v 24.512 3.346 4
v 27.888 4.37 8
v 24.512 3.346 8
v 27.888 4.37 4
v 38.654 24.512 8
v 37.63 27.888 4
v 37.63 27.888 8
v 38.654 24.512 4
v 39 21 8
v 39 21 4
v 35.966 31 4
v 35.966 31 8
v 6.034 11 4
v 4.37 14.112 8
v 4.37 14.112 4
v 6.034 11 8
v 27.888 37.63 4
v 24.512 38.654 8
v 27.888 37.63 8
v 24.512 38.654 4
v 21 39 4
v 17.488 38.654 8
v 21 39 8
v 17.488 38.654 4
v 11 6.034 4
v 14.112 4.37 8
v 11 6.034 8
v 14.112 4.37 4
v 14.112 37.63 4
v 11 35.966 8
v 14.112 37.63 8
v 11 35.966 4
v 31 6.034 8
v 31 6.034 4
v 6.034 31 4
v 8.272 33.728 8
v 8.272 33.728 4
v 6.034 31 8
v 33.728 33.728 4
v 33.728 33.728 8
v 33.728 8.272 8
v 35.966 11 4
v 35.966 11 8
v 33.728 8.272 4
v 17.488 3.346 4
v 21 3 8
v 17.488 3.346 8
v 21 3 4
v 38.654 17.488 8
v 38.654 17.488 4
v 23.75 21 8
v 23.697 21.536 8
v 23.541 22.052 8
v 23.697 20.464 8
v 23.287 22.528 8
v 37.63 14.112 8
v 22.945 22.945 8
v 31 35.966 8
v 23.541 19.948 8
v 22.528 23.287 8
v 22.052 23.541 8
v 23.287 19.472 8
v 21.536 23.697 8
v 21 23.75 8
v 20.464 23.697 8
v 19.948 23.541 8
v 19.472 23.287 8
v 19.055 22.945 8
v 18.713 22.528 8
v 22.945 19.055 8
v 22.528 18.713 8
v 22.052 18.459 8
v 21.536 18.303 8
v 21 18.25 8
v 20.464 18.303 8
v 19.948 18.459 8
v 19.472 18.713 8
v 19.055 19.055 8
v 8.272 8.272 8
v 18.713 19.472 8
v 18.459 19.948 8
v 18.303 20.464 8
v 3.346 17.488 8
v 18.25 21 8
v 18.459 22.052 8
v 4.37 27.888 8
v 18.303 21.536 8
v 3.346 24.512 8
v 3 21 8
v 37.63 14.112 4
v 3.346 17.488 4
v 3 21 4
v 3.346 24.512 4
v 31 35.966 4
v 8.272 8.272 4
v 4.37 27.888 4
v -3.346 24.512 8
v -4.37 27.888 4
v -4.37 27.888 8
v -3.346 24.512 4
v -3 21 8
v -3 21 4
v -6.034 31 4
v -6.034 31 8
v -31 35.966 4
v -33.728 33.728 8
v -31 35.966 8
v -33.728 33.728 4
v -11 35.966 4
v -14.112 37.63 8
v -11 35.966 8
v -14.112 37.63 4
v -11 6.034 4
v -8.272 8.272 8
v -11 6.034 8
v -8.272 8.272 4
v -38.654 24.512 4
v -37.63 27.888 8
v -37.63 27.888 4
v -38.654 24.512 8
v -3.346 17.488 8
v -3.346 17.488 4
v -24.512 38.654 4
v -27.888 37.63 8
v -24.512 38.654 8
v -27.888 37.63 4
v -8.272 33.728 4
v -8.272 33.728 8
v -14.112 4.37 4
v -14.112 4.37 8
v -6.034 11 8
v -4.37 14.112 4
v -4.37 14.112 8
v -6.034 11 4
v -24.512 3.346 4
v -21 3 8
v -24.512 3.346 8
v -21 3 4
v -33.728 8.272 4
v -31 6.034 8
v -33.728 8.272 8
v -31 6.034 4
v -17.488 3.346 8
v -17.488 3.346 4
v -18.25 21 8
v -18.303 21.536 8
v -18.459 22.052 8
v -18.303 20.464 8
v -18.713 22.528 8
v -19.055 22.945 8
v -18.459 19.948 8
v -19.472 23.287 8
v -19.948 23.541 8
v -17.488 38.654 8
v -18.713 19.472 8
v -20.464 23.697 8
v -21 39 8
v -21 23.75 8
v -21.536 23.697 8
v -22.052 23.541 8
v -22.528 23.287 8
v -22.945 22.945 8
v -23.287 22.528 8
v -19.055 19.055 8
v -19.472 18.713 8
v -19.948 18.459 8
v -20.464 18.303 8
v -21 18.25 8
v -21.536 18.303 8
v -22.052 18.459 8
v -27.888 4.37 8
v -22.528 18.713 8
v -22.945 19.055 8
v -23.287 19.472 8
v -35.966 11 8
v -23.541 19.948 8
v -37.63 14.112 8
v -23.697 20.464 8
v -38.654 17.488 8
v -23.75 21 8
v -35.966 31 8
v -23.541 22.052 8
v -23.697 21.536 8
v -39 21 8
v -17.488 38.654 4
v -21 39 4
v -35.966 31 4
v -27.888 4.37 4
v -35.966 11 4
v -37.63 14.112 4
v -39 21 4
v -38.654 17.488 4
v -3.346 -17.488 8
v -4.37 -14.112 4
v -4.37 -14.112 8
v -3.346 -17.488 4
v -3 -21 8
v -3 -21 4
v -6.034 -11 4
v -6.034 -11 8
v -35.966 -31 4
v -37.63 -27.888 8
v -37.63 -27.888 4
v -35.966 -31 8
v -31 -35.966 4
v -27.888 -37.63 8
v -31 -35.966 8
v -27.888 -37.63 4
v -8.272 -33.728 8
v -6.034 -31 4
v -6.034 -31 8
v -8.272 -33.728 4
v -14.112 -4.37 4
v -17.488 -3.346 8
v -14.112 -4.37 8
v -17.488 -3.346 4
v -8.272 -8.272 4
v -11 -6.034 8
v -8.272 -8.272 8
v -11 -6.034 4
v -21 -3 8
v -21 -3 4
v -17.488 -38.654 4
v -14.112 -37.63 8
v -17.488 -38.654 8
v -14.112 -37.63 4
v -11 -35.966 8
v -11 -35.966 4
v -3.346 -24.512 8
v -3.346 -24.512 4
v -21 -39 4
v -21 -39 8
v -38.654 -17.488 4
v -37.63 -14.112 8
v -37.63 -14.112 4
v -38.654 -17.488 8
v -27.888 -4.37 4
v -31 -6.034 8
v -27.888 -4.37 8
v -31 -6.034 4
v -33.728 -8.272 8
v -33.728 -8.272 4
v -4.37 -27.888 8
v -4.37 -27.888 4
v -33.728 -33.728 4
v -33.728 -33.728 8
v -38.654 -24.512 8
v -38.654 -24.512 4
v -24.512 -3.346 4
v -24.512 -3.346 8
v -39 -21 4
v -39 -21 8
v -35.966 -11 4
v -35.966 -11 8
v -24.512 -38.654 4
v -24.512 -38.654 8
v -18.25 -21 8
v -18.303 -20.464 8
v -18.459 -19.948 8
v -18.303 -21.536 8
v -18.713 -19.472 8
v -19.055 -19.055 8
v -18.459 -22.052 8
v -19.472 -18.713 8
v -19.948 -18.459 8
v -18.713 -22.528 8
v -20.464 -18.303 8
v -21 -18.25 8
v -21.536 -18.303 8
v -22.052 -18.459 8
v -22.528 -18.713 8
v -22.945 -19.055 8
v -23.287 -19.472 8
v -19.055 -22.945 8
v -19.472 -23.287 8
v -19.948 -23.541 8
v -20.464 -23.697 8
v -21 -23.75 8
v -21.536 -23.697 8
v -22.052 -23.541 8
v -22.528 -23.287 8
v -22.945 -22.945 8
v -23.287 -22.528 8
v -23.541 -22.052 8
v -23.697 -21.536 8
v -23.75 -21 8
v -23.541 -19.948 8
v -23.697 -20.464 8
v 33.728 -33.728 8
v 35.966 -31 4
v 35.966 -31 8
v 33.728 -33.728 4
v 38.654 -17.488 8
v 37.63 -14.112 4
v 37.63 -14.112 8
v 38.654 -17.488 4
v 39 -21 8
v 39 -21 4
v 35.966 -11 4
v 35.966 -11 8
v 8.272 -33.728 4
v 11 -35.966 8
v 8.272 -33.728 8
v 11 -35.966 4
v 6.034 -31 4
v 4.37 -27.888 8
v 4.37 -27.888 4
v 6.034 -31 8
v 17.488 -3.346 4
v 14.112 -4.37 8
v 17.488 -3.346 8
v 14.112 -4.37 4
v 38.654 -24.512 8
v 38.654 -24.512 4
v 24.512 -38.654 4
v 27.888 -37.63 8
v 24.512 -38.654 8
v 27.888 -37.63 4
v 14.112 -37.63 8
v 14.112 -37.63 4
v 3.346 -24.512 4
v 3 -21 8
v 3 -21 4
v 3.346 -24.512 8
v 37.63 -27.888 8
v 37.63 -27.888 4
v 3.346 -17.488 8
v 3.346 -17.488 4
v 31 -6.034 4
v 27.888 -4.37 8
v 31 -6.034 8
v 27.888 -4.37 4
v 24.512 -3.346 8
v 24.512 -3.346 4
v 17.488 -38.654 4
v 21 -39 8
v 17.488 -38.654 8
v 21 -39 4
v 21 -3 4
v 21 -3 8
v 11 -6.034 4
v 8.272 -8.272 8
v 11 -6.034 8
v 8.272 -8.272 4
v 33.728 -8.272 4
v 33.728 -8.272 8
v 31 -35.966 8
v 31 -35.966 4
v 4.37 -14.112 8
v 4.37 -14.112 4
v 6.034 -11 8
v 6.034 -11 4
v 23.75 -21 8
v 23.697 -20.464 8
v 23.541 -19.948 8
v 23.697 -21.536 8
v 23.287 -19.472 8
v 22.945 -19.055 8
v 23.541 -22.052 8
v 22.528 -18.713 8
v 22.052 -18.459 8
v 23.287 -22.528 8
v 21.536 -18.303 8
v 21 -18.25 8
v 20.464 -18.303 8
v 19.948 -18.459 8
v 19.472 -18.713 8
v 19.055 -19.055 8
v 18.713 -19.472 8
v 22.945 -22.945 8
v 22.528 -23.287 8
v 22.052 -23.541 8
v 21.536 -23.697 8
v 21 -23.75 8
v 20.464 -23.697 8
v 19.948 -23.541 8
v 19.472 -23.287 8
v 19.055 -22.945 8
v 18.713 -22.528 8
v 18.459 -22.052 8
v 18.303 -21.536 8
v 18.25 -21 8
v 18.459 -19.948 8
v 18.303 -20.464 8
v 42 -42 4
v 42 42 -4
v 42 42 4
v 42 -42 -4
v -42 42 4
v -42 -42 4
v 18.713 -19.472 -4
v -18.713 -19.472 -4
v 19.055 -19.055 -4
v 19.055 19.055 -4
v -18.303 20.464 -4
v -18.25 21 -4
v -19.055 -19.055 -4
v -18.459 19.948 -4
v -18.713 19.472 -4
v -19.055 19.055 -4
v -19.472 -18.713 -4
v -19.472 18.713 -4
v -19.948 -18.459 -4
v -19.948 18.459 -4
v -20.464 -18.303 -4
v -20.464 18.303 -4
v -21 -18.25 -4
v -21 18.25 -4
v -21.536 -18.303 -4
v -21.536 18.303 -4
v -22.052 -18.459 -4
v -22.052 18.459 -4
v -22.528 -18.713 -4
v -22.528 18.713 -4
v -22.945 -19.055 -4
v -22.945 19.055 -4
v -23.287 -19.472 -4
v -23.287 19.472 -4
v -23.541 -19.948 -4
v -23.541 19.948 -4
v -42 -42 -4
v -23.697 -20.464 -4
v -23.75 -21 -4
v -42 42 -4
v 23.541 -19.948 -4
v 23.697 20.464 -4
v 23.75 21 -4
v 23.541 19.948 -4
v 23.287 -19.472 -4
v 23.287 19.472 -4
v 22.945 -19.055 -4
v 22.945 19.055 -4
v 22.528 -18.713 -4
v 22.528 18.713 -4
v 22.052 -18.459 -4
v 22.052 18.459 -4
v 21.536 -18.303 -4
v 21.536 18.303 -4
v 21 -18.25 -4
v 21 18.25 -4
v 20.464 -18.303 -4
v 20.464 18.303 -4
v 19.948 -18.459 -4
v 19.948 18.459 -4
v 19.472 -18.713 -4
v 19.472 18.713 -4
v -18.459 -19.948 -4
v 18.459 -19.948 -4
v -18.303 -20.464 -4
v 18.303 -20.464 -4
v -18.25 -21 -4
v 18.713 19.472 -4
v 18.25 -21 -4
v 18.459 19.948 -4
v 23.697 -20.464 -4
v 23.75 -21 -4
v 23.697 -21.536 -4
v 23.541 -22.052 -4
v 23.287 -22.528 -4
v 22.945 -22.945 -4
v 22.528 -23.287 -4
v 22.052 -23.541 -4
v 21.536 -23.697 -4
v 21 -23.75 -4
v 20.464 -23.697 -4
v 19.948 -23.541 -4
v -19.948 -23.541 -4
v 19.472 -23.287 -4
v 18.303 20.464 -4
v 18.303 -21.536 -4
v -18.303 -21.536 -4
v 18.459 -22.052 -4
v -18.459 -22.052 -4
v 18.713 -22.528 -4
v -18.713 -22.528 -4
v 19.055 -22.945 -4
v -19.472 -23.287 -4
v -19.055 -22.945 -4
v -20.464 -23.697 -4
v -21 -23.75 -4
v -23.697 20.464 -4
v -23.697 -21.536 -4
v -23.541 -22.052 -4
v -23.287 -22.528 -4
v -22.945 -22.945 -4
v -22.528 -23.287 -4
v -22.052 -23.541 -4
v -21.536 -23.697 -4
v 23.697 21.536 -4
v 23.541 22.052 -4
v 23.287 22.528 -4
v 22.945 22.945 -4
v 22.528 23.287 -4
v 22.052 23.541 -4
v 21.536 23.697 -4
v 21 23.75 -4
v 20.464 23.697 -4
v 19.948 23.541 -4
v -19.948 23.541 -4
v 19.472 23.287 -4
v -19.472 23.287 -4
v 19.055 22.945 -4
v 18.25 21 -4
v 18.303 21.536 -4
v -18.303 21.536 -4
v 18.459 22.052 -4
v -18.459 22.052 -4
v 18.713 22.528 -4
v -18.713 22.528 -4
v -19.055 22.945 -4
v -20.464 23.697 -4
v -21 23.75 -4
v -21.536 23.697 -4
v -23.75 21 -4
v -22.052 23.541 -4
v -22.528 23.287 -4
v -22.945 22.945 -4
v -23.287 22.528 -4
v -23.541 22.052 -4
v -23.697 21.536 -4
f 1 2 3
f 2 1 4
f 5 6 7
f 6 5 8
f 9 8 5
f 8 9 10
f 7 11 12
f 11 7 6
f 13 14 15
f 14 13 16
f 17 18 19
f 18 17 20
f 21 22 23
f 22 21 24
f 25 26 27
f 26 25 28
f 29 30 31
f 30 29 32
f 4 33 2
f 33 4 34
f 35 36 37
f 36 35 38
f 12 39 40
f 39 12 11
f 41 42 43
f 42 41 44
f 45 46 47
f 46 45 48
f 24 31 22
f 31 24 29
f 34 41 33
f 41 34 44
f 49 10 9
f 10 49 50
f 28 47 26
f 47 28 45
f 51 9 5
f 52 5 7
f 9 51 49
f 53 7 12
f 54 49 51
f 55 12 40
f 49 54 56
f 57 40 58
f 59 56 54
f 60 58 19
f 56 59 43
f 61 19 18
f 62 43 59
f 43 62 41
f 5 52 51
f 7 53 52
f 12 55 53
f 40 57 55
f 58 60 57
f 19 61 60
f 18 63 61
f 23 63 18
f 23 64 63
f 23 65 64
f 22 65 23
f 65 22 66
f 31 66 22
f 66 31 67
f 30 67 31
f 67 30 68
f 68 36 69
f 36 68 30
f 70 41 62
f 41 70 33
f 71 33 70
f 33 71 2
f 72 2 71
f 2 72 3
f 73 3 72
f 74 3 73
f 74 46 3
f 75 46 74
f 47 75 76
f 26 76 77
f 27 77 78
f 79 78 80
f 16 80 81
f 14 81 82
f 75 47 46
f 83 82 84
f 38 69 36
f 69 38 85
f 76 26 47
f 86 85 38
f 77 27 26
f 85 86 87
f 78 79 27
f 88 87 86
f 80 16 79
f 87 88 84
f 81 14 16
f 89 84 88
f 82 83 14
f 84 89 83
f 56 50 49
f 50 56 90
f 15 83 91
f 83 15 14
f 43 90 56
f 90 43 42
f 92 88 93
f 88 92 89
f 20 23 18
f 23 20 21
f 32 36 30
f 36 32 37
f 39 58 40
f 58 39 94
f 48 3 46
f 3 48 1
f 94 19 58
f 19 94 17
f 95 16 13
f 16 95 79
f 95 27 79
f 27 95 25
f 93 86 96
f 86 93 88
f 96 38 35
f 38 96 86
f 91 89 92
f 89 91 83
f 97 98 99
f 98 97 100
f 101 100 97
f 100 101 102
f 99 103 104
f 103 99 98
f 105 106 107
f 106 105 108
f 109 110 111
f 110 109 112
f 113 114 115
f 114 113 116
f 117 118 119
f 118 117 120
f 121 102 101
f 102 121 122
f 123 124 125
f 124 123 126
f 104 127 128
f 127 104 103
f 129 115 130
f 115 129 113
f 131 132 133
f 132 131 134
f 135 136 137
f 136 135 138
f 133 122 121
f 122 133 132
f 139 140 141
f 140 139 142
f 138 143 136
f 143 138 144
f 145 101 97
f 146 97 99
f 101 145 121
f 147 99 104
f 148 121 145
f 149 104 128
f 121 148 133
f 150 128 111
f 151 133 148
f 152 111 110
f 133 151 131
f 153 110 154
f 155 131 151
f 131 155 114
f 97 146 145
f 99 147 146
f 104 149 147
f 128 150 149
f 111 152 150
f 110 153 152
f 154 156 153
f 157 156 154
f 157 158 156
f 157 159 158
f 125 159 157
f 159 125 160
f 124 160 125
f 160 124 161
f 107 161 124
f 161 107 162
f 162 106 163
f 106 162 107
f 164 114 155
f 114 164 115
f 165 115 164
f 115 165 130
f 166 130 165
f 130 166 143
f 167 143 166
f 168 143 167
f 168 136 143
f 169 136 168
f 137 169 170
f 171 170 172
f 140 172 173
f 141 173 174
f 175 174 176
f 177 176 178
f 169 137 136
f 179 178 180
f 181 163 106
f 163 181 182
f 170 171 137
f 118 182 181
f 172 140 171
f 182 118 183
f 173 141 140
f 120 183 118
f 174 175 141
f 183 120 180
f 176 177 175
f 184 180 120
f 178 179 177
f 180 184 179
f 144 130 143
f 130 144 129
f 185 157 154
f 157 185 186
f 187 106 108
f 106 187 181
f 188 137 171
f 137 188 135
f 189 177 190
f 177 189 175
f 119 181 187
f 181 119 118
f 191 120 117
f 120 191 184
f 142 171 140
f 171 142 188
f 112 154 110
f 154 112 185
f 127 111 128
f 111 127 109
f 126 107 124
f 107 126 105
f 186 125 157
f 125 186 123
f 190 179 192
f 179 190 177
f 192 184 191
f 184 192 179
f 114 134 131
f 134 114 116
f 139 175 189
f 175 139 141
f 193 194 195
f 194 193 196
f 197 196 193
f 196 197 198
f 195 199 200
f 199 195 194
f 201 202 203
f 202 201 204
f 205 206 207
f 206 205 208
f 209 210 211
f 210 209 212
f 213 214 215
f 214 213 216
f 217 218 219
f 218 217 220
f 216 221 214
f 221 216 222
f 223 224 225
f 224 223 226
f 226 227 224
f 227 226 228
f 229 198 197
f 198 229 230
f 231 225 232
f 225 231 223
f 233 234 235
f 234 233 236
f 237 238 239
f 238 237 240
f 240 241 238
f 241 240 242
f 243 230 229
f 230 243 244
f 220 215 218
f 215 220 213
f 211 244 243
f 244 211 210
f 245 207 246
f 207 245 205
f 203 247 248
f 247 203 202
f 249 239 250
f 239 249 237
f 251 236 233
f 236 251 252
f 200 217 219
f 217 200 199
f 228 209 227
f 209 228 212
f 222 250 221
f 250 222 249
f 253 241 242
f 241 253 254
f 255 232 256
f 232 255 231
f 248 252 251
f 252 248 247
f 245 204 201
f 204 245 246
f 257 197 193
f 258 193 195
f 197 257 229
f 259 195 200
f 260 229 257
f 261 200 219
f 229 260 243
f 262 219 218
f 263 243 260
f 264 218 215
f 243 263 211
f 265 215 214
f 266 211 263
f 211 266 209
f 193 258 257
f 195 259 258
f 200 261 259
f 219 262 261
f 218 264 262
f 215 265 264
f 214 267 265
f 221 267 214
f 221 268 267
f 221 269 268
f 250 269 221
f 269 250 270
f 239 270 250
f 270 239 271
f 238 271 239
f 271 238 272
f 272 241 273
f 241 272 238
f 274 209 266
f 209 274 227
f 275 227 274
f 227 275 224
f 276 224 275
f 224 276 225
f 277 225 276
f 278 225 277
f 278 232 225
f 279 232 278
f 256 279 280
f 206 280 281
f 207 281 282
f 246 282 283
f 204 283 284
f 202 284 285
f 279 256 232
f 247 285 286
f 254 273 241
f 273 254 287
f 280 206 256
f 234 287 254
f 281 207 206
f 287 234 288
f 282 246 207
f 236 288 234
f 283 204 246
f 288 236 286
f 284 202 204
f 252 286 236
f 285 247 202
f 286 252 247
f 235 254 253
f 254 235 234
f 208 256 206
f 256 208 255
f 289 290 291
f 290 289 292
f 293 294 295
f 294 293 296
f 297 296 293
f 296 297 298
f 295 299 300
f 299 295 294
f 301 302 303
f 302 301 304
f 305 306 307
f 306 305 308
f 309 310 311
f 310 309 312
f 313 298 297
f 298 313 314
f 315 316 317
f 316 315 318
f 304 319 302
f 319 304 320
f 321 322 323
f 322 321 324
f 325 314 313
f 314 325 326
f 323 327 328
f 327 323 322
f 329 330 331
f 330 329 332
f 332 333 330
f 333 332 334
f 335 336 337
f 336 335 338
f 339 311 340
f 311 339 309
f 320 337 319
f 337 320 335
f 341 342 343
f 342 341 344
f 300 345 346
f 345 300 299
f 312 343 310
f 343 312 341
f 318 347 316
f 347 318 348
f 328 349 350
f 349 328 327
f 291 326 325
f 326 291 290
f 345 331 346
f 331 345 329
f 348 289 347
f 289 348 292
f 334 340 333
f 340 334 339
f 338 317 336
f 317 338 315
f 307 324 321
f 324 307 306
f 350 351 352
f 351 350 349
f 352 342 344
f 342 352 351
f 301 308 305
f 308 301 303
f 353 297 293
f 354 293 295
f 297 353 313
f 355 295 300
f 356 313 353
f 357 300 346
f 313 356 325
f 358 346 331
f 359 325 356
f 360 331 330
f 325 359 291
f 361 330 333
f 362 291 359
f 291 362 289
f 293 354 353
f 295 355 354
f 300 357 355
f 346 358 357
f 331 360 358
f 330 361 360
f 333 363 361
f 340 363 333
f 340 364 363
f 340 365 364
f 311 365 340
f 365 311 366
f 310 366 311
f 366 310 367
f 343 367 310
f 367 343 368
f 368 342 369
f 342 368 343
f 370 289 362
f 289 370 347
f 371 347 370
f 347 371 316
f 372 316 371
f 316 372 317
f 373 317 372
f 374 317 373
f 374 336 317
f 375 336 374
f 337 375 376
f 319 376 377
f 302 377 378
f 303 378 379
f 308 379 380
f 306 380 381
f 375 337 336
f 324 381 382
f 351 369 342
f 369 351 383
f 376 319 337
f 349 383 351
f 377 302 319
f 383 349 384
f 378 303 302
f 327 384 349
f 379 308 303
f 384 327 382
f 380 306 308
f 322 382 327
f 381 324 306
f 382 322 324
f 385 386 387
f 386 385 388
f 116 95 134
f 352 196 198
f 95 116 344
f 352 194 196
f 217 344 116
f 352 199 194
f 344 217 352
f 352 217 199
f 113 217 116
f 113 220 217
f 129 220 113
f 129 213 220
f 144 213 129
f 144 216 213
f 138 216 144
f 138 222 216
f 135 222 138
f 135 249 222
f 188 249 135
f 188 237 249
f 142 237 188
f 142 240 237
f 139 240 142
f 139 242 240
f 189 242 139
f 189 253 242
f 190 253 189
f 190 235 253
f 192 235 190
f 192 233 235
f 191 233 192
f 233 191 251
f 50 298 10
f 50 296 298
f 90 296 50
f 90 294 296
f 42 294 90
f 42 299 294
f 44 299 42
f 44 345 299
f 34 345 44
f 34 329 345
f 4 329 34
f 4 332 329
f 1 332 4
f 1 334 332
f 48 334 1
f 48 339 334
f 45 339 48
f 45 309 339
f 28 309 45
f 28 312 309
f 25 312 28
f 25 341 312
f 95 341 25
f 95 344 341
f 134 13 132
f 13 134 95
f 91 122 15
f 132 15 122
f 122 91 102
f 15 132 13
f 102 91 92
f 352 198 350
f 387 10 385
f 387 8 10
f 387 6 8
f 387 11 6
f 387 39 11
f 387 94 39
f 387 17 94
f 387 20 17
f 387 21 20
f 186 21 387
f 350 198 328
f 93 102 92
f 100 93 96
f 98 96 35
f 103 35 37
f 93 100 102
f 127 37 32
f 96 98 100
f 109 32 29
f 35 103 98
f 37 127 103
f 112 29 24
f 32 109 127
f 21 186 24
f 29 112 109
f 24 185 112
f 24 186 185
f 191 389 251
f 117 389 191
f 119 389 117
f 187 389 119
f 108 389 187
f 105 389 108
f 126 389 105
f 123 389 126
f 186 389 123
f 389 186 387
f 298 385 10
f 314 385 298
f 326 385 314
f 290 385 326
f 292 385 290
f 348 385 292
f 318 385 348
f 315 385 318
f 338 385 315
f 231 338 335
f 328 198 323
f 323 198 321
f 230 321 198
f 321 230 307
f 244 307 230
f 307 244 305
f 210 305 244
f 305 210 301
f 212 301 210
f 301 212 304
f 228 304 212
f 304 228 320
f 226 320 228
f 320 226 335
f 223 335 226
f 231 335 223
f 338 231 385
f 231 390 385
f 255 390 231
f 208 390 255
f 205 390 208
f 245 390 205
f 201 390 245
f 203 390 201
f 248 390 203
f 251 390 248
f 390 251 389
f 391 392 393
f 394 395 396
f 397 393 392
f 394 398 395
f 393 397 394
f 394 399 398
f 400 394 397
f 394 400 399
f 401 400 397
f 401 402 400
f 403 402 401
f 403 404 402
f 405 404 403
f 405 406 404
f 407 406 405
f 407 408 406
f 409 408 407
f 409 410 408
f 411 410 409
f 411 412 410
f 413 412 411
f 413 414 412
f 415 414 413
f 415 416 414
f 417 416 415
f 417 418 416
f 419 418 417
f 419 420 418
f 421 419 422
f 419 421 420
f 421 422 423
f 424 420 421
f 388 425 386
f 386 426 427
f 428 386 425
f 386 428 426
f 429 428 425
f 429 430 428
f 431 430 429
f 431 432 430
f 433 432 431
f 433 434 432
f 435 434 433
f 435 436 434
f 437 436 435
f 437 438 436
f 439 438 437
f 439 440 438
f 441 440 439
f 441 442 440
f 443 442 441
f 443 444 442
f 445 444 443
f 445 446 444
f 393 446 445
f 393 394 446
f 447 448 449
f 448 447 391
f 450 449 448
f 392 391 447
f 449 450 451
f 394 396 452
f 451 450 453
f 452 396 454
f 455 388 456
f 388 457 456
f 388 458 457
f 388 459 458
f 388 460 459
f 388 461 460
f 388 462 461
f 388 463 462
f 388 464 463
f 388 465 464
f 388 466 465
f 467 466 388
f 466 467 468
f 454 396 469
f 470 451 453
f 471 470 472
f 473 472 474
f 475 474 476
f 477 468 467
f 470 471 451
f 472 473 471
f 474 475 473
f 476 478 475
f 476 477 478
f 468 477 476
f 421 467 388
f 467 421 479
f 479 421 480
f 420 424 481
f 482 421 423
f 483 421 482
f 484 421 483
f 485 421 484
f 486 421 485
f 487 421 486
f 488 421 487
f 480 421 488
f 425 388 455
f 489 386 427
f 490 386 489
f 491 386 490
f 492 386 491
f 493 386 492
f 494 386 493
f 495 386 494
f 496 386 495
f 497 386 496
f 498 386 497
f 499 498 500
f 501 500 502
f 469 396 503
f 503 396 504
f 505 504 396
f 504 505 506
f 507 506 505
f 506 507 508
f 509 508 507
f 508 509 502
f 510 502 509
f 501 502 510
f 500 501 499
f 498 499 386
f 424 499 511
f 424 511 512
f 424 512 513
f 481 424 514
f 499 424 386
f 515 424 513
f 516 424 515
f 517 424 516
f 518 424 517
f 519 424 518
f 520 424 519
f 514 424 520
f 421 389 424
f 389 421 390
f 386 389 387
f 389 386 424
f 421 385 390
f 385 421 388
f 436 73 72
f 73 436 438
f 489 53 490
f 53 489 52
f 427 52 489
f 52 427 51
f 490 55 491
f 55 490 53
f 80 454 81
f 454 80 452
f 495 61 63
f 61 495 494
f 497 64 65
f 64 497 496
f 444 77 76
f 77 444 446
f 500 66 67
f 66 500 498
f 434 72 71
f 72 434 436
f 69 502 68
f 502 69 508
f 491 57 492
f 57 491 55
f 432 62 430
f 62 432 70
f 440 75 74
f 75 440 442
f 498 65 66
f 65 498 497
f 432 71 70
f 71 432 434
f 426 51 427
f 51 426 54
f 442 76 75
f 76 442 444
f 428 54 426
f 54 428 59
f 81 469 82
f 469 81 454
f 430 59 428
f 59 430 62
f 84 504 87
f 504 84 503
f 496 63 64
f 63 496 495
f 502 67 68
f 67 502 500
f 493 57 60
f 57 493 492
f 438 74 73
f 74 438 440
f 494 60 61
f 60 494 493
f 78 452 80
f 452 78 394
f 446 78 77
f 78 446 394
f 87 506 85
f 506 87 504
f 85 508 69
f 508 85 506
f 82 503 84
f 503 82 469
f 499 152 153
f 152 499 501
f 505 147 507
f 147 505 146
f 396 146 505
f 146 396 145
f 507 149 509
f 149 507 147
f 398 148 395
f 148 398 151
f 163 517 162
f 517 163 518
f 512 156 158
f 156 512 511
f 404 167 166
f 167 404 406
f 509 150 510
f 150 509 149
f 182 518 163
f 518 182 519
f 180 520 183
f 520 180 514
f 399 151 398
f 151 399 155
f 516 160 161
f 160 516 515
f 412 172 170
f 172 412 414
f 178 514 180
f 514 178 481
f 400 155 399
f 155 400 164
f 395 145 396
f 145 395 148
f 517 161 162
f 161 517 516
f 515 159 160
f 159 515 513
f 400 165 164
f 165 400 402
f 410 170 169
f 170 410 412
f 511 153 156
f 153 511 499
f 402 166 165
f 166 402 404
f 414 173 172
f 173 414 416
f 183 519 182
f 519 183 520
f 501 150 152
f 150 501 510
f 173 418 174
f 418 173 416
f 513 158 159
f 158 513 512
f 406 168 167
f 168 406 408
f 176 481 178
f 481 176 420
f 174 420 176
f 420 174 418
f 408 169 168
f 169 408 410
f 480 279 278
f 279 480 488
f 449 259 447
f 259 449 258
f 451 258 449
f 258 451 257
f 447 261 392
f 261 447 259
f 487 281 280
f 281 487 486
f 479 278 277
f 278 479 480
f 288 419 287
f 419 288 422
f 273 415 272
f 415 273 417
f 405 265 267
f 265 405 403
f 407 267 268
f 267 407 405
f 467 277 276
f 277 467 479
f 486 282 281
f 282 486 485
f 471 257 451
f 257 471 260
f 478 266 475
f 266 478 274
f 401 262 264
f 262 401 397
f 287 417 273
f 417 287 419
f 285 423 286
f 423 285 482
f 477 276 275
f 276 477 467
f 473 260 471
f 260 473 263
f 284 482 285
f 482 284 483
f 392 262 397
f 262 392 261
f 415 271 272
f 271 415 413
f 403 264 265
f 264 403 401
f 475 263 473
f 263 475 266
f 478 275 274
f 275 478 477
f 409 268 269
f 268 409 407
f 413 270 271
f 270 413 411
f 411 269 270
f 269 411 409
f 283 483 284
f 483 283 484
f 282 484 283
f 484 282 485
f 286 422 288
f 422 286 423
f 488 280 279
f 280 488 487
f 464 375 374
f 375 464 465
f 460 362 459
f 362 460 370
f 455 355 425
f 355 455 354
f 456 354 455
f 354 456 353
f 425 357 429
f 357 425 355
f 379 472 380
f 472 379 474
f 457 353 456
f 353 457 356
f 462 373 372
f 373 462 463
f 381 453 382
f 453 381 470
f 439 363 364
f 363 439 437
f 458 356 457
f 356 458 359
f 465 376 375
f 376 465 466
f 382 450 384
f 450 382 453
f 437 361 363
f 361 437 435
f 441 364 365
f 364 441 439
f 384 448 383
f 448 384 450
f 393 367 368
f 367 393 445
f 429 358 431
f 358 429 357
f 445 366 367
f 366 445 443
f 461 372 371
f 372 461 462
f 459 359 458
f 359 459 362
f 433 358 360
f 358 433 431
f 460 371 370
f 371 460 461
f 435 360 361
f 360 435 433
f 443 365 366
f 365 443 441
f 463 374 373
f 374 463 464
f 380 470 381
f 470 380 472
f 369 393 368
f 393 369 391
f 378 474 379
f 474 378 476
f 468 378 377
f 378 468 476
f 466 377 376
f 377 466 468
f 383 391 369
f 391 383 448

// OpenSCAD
$fn = 32;

// ----------------------------------------------------------------------
// Anchor pads 84 x 84 x 12
// four corner bosses with anchor holes
// ----------------------------------------------------------------------

// --- parameters (mm) ---
plate = [84, 84, 8];  // base plate size (x, y, z)
seat_tol = 0.15;      // tolerance at the seating features
free_tol = 0.5;       // general tolerance on the free sizes
pads = 4;             // boss count, one per corner
edge = 21;            // boss centre offset from the plate edge
boss_d = 36;          // boss diameter
boss_h = 4;           // boss height above the base plate
hole_d = 5.5;         // hole diameter

// --- derived feature positions (mm) ---
height = plate[2] + boss_h;      // = 12   overall height of the part
corner_x = plate[0] / 2 - edge;  // = 21   boss centre X
corner_y = plate[1] / 2 - edge;  // = 21   boss centre Y
feature_centers = [
  [corner_x, corner_y],
  [-corner_x, corner_y],
  [-corner_x, -corner_y],
  [corner_x, -corner_y]
];   // boss centres, anchor holes are drilled there

// base plate, four bosses standing on it, anchor holes all the way through
difference() {
  union() {
    cube(plate, center = true);
    for (centre = feature_centers)
      translate([centre[0], centre[1], plate[2] / 2 - 1])
        cylinder(d = boss_d, h = boss_h + 1);
  }
  for (centre = feature_centers)
    translate([centre[0], centre[1], -height])
      cylinder(d = hole_d, h = 2 * height + 2);  // through boss and plate
}
